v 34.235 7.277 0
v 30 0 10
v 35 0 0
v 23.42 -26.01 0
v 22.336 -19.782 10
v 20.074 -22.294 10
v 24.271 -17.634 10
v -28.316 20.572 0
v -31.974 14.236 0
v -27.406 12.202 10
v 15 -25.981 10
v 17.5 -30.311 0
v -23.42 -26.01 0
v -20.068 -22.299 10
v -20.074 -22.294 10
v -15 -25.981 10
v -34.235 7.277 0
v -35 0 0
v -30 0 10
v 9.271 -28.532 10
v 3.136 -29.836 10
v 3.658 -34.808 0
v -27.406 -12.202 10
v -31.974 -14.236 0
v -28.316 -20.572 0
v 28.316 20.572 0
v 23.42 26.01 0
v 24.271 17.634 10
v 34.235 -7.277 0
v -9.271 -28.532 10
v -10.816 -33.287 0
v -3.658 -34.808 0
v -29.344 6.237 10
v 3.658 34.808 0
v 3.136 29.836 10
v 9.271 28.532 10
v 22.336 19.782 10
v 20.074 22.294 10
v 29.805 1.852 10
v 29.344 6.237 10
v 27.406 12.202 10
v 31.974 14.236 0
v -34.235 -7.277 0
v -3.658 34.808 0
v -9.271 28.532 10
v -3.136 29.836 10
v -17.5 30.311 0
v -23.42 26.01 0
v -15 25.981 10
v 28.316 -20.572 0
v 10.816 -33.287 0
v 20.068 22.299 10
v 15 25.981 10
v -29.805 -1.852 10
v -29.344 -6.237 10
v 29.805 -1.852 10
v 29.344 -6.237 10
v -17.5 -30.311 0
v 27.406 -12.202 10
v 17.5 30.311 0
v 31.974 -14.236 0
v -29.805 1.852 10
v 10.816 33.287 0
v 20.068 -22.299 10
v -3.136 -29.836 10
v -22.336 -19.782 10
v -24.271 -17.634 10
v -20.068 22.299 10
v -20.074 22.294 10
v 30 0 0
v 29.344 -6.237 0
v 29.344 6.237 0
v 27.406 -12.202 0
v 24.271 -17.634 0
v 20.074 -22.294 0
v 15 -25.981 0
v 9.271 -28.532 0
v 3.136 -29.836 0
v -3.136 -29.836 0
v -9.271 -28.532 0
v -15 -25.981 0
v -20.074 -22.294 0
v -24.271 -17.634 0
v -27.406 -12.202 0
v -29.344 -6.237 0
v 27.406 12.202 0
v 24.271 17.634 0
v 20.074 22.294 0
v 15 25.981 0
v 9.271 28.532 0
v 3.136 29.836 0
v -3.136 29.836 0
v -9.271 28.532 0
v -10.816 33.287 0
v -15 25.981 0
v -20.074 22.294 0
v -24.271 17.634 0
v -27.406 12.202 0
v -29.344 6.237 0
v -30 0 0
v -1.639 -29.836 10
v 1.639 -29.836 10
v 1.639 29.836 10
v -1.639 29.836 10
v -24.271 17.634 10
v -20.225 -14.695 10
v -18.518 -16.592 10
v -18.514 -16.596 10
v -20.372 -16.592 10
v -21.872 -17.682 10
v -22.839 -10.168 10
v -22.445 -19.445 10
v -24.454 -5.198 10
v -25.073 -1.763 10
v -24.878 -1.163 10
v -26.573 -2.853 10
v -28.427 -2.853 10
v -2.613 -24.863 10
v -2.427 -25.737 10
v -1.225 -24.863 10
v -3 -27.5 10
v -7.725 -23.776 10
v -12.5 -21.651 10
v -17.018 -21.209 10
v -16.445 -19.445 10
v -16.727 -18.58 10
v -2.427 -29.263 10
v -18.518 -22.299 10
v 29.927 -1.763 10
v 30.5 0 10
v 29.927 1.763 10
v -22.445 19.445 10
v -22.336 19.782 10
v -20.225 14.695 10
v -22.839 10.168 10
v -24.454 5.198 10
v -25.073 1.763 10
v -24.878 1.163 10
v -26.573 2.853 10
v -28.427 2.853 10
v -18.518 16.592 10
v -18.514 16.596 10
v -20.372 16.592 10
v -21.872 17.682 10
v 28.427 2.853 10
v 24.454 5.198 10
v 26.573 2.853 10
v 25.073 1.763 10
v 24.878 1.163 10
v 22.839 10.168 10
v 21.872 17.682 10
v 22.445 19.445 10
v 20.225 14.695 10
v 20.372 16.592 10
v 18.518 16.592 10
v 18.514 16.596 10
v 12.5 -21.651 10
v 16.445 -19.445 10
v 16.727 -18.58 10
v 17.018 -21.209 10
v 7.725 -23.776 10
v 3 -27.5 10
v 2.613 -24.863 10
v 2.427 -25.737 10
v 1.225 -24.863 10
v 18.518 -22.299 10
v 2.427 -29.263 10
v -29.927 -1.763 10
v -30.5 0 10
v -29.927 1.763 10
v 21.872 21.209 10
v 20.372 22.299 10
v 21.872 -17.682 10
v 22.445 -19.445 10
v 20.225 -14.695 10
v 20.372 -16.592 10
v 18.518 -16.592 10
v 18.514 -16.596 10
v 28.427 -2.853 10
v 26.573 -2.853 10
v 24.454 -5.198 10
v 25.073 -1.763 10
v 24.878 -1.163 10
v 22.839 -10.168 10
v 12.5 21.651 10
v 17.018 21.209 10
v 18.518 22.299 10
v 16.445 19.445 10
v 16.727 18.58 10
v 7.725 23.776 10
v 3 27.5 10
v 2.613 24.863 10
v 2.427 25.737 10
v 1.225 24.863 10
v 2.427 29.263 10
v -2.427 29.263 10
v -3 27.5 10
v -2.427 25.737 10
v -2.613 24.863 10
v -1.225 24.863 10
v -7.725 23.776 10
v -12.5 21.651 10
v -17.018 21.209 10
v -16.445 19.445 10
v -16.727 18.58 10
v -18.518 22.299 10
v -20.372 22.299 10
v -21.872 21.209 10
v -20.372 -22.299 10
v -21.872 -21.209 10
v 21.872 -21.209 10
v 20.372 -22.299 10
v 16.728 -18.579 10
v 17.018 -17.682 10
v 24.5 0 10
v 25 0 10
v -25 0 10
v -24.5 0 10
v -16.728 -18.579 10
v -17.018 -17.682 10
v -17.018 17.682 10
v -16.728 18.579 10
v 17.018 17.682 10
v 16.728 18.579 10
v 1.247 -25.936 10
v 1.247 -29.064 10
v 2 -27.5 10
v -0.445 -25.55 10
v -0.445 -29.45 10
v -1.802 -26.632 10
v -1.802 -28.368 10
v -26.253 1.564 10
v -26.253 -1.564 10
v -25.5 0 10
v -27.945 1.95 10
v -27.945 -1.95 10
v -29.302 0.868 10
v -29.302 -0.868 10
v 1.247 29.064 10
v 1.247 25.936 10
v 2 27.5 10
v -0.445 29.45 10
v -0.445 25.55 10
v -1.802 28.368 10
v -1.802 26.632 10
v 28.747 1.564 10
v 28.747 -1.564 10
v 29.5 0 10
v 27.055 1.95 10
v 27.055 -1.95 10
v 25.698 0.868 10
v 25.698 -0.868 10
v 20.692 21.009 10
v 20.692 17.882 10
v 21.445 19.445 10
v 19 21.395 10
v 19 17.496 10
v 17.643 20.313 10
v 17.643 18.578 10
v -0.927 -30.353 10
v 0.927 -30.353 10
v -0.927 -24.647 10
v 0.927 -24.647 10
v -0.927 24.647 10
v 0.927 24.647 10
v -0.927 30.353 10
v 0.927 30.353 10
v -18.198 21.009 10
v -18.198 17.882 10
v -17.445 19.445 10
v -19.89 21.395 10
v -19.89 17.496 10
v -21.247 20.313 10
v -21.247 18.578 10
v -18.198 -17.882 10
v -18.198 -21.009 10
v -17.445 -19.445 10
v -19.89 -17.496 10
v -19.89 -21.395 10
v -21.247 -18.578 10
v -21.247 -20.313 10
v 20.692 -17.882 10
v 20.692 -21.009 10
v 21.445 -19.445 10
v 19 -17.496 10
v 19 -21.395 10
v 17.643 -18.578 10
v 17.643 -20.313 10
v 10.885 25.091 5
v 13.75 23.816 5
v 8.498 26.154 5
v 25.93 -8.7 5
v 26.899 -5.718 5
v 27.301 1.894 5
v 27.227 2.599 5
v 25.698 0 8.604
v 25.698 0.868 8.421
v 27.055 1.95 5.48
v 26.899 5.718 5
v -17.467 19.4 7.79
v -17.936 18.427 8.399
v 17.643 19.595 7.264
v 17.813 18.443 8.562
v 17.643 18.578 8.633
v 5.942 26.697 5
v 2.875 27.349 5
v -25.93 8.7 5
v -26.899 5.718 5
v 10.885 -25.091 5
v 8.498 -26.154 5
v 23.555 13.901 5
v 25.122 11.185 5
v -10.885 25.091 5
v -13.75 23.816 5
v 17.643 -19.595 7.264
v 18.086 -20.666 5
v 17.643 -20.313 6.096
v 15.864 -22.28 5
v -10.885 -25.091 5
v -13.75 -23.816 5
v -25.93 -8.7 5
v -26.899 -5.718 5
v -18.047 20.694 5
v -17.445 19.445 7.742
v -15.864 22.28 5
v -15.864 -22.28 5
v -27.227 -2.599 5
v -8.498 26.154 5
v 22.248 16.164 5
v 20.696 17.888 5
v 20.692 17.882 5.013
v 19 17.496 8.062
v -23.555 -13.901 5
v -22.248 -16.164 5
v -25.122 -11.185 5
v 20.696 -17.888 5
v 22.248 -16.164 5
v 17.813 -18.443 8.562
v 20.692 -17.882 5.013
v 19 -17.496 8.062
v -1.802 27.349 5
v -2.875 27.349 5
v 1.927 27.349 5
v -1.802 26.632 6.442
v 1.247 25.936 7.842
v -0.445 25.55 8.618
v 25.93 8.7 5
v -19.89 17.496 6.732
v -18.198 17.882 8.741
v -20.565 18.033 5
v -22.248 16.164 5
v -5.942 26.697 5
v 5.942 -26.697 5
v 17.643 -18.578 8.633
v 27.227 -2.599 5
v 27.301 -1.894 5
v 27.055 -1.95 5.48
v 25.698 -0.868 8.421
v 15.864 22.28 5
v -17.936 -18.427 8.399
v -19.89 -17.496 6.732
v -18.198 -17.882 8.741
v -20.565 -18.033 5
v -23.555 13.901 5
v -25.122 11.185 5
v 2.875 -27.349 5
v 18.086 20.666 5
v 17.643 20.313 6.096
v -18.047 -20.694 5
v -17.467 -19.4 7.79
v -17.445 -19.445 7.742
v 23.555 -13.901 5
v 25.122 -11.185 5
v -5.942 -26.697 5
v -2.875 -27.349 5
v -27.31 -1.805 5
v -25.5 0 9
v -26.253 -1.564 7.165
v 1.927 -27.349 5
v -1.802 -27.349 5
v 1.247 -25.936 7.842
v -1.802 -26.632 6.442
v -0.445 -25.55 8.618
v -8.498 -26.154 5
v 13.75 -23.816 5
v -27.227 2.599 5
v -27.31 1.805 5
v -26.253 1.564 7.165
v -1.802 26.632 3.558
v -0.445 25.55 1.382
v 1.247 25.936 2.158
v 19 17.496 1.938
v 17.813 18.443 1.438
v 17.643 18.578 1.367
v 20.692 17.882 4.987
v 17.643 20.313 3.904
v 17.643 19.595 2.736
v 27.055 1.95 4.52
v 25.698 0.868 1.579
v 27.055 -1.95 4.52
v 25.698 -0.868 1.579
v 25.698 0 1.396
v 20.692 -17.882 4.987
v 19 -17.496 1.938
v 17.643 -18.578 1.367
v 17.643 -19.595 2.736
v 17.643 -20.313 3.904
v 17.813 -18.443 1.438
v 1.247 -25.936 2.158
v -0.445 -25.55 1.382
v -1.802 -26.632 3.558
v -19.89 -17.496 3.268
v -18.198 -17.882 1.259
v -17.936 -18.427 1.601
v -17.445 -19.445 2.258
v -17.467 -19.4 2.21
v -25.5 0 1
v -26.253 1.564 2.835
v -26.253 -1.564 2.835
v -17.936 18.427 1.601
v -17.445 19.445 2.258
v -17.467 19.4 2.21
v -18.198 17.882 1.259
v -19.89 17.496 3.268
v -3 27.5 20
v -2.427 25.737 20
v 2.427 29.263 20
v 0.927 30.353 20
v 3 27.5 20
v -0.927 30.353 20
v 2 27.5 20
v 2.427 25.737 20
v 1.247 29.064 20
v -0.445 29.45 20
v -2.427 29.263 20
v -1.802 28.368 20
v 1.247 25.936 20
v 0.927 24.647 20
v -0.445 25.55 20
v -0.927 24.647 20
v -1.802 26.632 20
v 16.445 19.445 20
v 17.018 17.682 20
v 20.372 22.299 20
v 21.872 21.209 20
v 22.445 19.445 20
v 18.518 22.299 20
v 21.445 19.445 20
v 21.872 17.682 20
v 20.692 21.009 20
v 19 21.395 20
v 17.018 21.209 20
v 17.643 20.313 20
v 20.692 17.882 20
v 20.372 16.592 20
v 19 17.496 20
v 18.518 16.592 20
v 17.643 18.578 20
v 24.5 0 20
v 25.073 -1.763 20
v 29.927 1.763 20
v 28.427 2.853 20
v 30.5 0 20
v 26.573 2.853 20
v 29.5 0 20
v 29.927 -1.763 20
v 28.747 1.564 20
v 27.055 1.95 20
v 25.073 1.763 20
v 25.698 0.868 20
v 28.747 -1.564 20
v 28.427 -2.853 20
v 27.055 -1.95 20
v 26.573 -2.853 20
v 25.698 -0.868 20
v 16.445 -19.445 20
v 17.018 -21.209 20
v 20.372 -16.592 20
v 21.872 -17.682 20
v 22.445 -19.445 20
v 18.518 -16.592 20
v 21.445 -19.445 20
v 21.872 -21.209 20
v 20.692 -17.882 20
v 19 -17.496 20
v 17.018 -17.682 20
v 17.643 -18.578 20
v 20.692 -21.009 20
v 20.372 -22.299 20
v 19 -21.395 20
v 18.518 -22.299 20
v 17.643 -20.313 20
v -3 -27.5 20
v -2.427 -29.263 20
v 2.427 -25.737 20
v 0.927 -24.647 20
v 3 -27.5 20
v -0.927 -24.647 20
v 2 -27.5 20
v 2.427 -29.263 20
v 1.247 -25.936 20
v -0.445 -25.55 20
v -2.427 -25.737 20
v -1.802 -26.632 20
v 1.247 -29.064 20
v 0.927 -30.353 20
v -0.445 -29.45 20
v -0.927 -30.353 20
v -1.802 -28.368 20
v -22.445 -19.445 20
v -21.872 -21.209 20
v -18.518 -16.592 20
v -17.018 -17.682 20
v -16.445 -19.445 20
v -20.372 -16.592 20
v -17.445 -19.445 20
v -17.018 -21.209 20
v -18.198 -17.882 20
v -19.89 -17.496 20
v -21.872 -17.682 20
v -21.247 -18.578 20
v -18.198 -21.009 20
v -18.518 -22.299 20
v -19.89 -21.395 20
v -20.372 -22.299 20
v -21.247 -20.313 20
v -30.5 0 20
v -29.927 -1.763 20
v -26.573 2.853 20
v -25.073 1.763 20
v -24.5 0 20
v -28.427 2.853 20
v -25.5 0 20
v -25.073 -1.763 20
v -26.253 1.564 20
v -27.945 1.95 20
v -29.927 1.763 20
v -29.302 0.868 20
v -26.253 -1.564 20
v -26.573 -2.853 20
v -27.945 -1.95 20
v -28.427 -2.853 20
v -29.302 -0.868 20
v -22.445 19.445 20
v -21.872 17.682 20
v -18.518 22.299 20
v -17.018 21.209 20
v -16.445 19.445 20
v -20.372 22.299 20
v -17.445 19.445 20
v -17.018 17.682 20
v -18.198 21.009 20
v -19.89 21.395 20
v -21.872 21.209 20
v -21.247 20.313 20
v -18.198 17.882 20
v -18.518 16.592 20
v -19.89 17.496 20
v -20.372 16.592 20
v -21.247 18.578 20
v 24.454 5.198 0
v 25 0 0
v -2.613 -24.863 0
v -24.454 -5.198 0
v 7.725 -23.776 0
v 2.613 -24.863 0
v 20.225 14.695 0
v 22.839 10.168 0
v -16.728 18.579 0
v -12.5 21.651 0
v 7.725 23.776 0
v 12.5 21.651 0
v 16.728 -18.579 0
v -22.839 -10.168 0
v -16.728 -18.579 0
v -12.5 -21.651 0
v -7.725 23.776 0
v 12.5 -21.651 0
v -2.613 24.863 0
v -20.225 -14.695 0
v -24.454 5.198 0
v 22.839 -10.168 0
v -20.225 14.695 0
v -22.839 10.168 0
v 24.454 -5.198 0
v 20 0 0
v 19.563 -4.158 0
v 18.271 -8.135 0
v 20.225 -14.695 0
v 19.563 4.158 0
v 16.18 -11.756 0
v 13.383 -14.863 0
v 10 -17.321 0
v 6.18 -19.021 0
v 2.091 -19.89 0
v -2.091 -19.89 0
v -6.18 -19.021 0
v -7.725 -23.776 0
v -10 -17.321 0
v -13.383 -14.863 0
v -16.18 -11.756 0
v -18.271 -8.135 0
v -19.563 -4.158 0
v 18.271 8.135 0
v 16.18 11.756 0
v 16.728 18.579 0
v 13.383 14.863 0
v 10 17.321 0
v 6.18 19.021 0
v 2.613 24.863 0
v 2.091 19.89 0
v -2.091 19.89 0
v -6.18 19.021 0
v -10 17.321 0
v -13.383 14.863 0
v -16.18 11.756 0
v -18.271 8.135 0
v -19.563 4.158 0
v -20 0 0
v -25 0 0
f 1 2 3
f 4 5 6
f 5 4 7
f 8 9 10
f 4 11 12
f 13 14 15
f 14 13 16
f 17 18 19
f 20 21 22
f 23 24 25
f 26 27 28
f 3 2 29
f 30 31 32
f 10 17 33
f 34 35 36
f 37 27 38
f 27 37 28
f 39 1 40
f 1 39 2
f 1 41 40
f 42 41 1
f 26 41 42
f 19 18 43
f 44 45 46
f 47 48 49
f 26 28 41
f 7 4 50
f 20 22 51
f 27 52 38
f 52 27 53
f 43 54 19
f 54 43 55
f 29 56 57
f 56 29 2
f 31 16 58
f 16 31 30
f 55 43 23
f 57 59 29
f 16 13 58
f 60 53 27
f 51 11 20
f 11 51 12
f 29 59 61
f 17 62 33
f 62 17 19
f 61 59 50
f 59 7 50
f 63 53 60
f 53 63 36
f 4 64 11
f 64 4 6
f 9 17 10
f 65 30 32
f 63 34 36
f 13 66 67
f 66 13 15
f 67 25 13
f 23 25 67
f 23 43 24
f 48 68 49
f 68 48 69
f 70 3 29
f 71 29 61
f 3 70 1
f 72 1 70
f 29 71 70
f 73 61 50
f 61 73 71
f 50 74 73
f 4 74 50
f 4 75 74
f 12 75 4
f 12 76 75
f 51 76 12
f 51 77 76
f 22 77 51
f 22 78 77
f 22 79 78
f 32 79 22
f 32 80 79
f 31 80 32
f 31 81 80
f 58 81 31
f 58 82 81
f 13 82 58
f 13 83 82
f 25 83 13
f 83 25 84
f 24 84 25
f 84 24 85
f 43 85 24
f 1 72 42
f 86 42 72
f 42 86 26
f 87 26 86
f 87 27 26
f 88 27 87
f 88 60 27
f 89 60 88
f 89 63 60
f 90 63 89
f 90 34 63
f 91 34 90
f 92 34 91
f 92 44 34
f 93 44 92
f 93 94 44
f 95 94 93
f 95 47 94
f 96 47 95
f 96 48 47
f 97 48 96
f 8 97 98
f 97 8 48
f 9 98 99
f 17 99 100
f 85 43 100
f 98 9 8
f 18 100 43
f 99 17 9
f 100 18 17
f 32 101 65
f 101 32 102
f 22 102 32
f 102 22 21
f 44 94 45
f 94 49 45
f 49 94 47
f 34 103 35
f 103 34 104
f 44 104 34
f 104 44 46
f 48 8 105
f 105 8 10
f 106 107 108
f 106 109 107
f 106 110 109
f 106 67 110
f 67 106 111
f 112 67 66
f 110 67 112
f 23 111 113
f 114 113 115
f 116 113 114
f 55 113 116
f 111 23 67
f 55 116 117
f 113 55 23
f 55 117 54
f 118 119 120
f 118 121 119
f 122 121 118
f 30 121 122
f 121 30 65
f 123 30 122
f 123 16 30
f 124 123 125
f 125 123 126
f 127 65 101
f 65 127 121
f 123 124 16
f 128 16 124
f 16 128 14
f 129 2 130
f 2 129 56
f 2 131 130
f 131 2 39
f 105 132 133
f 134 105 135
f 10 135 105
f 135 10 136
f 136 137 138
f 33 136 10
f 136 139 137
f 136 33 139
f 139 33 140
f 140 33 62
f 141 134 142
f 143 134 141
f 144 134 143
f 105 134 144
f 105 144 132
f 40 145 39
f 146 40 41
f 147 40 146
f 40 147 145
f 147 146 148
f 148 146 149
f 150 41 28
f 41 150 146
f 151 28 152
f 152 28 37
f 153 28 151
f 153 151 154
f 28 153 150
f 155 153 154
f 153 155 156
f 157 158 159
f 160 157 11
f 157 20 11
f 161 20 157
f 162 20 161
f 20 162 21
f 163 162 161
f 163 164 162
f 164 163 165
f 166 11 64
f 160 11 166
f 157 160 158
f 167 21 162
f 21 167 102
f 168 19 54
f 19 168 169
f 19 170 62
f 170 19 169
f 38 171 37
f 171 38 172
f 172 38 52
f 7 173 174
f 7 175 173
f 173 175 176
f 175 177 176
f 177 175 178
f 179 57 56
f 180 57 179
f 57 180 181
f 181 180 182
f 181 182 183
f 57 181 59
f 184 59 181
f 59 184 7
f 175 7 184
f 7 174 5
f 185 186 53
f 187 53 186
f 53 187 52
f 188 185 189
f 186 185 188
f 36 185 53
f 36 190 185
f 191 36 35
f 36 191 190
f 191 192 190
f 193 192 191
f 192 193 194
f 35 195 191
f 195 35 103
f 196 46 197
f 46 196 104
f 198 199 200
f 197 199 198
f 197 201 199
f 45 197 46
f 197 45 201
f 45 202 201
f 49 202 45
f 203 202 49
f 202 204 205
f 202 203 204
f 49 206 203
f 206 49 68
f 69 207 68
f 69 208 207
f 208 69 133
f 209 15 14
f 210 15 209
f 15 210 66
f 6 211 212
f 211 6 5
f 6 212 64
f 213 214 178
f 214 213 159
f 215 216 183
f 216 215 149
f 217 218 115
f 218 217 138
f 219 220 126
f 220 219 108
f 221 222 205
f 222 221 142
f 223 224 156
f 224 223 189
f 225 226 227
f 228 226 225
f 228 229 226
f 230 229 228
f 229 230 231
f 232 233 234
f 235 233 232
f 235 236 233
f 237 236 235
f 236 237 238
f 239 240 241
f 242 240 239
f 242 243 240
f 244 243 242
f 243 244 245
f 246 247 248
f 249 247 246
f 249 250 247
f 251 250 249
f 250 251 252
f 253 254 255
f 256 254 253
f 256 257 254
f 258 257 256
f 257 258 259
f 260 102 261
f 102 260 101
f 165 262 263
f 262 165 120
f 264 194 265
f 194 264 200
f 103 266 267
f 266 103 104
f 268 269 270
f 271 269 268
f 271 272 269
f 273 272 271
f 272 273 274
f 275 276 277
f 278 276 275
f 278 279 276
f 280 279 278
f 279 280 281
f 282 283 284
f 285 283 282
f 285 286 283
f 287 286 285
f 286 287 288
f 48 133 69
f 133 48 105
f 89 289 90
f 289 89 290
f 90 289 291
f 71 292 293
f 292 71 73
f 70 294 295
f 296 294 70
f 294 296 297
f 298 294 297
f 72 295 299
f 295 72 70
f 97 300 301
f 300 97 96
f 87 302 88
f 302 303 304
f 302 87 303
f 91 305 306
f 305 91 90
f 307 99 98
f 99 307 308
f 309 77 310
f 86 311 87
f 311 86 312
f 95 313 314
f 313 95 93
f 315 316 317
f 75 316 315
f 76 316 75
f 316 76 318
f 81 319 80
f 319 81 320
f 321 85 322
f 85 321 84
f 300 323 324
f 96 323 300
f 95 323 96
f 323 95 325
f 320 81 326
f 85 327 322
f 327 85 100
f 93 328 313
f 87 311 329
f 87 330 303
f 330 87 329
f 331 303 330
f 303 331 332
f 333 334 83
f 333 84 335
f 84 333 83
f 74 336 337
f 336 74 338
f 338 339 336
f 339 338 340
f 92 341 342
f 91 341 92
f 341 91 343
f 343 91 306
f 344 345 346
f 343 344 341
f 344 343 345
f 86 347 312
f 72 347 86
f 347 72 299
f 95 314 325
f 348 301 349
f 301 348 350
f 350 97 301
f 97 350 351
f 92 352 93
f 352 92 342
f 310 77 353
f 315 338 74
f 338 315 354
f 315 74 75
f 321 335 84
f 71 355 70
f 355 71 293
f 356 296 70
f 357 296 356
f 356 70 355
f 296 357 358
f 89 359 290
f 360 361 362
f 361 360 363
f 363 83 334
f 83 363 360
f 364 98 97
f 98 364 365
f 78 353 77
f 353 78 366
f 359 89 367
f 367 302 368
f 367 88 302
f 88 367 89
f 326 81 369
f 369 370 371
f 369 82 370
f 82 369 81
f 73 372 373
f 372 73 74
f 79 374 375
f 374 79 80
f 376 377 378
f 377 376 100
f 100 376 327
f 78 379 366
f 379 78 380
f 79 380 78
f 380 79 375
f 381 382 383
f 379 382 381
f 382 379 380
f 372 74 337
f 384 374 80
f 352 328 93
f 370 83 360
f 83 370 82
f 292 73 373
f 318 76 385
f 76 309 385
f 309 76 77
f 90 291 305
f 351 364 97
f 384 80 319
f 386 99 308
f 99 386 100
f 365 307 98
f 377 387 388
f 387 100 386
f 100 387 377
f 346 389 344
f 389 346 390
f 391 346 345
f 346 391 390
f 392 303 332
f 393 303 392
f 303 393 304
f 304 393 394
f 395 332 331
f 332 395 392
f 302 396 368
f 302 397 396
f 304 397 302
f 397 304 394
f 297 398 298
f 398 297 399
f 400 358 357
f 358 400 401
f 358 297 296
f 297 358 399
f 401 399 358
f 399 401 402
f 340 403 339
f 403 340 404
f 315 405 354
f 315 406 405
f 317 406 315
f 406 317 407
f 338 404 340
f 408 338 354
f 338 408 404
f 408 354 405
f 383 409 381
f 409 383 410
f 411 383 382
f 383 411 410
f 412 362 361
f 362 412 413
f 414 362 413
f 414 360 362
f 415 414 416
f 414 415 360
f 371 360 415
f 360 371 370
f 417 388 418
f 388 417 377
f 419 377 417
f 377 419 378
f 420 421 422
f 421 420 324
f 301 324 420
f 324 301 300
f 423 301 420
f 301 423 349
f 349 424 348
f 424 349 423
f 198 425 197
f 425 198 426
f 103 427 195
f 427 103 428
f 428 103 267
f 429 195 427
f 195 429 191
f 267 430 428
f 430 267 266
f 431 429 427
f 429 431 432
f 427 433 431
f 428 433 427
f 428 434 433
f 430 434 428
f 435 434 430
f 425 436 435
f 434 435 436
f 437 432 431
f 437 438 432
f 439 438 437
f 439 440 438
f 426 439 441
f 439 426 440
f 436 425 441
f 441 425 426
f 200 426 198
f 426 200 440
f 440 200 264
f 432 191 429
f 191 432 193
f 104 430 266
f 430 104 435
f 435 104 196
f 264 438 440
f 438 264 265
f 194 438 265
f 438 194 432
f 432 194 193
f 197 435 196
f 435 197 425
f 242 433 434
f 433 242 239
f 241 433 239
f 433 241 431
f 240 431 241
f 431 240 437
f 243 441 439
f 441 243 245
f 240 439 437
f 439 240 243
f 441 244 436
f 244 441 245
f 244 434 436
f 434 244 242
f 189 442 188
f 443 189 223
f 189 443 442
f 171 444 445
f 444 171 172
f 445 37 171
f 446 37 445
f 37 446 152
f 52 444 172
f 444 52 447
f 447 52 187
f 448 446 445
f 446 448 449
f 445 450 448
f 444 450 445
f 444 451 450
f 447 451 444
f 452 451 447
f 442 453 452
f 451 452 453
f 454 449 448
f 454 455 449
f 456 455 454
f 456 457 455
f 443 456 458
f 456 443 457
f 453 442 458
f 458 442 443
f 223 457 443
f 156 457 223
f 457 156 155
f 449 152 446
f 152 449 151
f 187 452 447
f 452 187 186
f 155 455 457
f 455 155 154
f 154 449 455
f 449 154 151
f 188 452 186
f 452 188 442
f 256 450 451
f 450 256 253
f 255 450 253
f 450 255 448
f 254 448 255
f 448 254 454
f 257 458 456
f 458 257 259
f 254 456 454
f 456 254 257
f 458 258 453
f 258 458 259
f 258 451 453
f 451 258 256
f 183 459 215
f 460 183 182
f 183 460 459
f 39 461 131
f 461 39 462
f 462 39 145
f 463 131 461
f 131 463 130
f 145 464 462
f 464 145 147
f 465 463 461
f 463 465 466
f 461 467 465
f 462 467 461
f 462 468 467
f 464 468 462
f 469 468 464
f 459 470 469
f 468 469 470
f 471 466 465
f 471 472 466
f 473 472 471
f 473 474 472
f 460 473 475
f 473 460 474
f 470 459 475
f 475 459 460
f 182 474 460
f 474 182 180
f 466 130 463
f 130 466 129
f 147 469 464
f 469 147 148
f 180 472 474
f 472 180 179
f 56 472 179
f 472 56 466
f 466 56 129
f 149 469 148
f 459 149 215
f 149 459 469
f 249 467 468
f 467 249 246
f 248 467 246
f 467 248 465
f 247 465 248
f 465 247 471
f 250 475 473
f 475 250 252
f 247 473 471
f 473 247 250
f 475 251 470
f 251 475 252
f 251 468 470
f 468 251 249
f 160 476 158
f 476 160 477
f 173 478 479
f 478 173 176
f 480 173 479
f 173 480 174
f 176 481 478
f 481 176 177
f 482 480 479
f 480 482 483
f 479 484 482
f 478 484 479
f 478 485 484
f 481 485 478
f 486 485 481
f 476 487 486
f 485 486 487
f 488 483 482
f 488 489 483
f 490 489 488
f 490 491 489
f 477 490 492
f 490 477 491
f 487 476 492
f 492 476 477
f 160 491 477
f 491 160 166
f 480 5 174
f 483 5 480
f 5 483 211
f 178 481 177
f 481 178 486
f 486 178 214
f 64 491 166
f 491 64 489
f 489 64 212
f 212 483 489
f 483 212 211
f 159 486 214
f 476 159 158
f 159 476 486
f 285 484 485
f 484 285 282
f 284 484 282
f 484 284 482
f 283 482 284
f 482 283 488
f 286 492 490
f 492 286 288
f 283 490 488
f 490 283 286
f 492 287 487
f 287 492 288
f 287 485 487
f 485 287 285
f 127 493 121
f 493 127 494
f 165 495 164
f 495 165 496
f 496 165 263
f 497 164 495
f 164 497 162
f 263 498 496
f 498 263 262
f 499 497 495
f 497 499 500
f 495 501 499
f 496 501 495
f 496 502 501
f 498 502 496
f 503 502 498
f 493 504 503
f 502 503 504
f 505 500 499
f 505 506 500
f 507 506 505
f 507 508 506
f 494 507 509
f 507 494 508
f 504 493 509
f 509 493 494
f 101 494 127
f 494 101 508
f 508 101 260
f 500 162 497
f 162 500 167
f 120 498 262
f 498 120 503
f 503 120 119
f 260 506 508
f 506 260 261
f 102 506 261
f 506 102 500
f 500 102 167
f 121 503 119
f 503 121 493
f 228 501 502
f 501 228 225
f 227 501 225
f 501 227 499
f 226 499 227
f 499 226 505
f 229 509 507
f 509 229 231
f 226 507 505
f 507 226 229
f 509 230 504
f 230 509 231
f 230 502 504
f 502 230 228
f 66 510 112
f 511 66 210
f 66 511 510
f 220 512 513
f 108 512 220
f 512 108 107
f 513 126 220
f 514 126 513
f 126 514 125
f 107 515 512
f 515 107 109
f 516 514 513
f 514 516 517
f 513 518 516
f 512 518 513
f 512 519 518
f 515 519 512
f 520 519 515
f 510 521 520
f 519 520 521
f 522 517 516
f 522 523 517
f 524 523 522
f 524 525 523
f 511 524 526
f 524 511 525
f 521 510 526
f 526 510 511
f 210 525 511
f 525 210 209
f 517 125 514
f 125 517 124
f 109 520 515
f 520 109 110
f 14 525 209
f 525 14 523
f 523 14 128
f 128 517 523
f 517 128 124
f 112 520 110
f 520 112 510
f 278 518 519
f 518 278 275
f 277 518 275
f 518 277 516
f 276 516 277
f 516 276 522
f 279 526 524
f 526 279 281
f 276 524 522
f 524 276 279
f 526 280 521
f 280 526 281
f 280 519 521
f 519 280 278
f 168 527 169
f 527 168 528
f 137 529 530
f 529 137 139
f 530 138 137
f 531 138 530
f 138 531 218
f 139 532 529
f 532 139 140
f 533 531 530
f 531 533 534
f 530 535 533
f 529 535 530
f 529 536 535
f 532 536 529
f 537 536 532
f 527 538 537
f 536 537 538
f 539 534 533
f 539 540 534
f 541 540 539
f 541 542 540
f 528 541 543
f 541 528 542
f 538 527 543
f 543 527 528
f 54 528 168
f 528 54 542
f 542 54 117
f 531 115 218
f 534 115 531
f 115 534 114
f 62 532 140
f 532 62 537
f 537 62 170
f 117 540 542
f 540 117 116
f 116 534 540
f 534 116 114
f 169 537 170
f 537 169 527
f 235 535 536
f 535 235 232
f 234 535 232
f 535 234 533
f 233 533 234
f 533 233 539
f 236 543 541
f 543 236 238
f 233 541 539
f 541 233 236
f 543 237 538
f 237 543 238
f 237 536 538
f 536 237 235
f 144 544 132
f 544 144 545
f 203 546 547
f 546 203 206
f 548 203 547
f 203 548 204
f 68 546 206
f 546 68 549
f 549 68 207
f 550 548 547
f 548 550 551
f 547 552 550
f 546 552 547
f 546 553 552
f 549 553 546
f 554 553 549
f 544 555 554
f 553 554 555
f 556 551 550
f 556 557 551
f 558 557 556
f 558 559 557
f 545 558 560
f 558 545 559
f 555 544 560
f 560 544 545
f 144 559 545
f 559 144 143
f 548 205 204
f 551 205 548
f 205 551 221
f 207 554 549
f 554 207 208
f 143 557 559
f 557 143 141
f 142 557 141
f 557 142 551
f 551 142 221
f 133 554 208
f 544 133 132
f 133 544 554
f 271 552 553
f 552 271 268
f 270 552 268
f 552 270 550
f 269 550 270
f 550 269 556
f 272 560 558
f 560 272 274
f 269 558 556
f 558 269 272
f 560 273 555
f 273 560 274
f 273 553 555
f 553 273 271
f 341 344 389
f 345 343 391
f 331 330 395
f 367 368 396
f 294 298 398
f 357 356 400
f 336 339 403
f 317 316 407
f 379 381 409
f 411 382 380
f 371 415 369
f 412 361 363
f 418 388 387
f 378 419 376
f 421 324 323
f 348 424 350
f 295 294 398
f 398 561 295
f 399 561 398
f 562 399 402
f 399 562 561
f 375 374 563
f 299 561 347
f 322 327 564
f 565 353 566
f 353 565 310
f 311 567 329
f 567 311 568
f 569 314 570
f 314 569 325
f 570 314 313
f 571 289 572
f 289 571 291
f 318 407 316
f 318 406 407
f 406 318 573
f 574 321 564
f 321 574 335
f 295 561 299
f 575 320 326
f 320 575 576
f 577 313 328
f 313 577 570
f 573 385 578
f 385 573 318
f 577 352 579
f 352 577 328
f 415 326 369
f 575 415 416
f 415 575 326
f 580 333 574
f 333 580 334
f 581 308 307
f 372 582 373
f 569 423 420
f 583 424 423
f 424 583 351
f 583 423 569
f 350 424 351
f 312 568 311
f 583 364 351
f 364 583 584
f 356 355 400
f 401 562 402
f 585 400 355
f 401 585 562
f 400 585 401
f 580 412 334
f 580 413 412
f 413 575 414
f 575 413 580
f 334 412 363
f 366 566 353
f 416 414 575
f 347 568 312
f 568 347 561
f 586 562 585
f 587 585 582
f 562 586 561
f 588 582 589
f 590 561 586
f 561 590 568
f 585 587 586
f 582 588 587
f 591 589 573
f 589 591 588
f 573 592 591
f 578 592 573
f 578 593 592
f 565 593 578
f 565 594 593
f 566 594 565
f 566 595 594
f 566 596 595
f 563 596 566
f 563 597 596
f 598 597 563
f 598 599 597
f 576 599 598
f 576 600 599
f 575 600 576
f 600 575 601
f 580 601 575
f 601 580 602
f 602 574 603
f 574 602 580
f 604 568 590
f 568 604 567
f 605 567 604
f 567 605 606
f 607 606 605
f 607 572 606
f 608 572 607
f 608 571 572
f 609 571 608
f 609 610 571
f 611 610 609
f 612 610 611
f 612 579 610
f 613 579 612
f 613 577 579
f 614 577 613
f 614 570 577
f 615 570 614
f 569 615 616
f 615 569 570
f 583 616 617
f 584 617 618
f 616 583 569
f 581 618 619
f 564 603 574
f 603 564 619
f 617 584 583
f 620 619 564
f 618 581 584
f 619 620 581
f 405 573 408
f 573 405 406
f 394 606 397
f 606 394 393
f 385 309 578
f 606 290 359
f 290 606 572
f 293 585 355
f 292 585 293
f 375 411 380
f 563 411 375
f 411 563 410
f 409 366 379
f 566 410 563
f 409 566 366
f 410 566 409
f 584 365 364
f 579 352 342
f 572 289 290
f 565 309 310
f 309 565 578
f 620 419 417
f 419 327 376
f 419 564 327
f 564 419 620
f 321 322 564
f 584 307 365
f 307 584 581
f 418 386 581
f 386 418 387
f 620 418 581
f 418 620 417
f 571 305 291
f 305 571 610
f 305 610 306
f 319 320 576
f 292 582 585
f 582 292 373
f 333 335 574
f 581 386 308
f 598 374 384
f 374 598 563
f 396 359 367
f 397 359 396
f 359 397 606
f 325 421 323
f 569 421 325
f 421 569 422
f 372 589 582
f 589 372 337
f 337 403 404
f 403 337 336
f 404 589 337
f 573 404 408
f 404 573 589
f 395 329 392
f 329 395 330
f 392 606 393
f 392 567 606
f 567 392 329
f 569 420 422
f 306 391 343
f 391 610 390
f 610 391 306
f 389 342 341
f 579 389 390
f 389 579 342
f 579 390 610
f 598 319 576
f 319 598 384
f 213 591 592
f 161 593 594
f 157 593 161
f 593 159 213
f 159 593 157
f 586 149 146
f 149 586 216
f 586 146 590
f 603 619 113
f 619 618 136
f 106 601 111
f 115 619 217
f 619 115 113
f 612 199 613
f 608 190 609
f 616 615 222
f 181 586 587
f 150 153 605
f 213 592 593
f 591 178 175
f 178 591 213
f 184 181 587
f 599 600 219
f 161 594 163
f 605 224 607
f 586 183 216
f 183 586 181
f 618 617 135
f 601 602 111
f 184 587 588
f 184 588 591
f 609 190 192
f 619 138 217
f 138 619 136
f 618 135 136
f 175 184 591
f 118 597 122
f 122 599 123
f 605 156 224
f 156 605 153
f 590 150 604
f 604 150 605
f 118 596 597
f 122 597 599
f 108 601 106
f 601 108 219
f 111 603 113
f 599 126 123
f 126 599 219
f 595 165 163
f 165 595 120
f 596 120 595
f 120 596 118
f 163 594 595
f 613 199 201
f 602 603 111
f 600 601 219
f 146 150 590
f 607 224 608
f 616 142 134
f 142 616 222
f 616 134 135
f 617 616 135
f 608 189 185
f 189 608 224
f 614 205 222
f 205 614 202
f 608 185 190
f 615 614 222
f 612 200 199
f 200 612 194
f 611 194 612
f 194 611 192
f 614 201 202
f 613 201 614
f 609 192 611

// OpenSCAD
pinoepel = 8;
radius = 35;
thickness = 5;
holes = radius - (1.5 * thickness);

difference() {
	cylinder(10, r1=radius, r2=radius-thickness);
	cylinder(10, r1=radius-thickness, r2=radius-(2 * thickness));
}

translate([0,0,8]) {
	difference() {
		cylinder(2, r=radius-thickness);
		cylinder(2, r=radius-(2*thickness));
		for (z = [0:pinoepel]) {
			translate([sin(z * 360/pinoepel)*holes, cos(z * 360/pinoepel)*holes, 0]){
				cylinder(2, r=2);
			}
		}
	}
}

for (z = [0:pinoepel]) {
	translate([sin(z * 360/pinoepel)*holes, cos(z * 360/pinoepel)*holes, 10]) {
		difference() {
			cylinder(10, r=3);
			cylinder(10, r=2);
		}
	}
}

difference() {
	cylinder(10, r1=radius-(2 * thickness), r2=radius-(1 * thickness));
	cylinder(10, r1=radius-(3 * thickness), r2=radius-(2 * thickness));
	for (z = [0:pinoepel]) {
		translate([sin(z * 360/pinoepel)*holes, cos(z * 360/pinoepel)*holes, 0]) {
				cylinder(10, r=2);
		}
	}
}
